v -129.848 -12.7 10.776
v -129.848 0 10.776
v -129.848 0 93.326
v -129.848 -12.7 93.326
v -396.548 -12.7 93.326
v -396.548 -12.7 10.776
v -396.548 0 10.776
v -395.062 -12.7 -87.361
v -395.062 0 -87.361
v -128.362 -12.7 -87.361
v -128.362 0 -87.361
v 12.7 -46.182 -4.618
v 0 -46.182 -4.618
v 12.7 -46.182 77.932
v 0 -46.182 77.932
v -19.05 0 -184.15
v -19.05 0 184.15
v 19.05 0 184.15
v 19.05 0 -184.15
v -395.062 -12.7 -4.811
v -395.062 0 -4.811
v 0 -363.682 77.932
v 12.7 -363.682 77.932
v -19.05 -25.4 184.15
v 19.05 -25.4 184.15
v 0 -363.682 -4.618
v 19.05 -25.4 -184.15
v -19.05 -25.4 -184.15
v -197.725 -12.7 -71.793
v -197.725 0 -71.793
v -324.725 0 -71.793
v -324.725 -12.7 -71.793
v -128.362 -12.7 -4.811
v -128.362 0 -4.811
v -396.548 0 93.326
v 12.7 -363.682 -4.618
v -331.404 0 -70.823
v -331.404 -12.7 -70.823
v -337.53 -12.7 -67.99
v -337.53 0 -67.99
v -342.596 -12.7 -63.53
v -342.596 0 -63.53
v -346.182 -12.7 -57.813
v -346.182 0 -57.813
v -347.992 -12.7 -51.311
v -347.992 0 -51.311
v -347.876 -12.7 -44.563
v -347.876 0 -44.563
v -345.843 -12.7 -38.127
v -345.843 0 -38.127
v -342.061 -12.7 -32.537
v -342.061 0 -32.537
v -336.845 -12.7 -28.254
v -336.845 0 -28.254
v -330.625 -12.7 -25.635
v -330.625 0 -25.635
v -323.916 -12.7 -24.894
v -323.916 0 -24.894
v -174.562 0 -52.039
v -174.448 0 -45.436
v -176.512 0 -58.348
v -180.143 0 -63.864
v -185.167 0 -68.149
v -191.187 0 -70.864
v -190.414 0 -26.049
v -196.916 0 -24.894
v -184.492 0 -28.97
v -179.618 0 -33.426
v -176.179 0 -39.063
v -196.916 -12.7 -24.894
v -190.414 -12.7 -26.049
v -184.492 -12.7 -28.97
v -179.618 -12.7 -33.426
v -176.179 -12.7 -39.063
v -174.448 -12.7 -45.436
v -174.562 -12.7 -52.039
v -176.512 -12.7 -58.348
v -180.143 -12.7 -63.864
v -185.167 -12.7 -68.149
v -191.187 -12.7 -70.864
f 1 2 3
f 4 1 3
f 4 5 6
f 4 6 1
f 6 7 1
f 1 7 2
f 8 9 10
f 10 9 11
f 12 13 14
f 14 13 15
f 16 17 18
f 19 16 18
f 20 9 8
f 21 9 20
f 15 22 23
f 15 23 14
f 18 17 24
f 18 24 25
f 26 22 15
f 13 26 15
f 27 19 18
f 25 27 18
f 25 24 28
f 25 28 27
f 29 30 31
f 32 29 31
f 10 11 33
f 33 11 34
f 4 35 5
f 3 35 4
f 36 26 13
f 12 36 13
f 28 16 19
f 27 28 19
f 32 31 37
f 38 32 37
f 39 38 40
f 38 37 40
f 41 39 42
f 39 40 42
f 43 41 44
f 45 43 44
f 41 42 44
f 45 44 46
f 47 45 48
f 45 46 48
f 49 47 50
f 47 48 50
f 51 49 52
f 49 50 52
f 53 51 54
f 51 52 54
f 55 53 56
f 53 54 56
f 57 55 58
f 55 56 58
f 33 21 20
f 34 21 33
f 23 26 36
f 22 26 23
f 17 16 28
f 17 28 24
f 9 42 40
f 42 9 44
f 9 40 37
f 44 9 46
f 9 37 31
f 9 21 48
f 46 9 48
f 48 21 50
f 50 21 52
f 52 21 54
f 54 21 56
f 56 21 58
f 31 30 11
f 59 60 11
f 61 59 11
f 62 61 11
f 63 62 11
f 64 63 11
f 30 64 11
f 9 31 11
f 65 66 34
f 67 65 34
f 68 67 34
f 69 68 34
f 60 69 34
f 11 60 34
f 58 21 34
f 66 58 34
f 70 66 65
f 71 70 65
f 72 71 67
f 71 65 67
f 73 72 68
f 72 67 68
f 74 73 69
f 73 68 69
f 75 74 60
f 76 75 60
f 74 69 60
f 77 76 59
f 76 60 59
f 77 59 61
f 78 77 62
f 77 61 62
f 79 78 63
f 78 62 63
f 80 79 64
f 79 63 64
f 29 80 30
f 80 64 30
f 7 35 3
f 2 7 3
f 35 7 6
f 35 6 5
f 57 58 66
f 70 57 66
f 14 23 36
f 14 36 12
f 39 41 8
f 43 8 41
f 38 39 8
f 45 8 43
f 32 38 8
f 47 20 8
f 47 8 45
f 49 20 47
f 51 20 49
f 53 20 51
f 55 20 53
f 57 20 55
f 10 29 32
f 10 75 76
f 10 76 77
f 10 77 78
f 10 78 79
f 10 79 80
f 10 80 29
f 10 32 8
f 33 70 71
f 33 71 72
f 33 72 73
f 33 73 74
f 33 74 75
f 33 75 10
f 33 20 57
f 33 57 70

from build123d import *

# Parameters (mm, degrees)
F0_W     = 38.1
F0_H     = 368.3
F1_DEPTH = 25.4
F2_W     = 266.7
F2_H     = 82.55
F3_DEPTH = 12.7
F4_W     = 266.7
F4_H     = 82.55
F5_DEPTH = 12.7
F6_W     = 317.5
F6_H     = 82.55
F7_DEPTH = 12.7


with BuildPart() as f1:
    # F0 (on Front) → F1 (new body)
    with BuildSketch(Plane.XZ):
        Rectangle(F0_W, F0_H)
    extrude(amount=F1_DEPTH)


with BuildPart() as f3:
    # F2 (on Front) → F3 (new body)
    with BuildSketch(Plane.XZ):
        with Locations((-263.197883749, 52.0507570222)):
            Rectangle(F2_W, F2_H)
    extrude(amount=F3_DEPTH)


with BuildPart() as f5:
    # F4 (on Front) → F5 (new body)
    with BuildSketch(Plane.XZ):
        with Locations((-261.7122530937, -46.0856069893)):
            Rectangle(F4_W, F4_H)
        with BuildLine():
            ThreePointArc((-324.7247487307, -71.793478018), (-348.1777791041, -47.9326123349), (-323.9161690893, -24.8943870487))
            Line((-323.9161690893, -24.8943870487), (-196.9161690893, -24.8943870487))
            ThreePointArc((-196.9161690893, -24.8943870487), (-174.2717183572, -48.741312141), (-197.7247487307, -71.793478018))
            Line((-197.7247487307, -71.793478018), (-324.7247487307, -71.793478018))
        make_face(mode=Mode.SUBTRACT)
    extrude(amount=F5_DEPTH)


with BuildPart() as f7:
    # F6 (on Right) → F7 (new body)
    with BuildSketch(Plane.YZ):
        with Locations((-204.9318166077, 36.656818153)):
            Rectangle(F6_W, F6_H)
    extrude(amount=F7_DEPTH)


solid = Compound([f1.part, f3.part, f5.part, f7.part])
